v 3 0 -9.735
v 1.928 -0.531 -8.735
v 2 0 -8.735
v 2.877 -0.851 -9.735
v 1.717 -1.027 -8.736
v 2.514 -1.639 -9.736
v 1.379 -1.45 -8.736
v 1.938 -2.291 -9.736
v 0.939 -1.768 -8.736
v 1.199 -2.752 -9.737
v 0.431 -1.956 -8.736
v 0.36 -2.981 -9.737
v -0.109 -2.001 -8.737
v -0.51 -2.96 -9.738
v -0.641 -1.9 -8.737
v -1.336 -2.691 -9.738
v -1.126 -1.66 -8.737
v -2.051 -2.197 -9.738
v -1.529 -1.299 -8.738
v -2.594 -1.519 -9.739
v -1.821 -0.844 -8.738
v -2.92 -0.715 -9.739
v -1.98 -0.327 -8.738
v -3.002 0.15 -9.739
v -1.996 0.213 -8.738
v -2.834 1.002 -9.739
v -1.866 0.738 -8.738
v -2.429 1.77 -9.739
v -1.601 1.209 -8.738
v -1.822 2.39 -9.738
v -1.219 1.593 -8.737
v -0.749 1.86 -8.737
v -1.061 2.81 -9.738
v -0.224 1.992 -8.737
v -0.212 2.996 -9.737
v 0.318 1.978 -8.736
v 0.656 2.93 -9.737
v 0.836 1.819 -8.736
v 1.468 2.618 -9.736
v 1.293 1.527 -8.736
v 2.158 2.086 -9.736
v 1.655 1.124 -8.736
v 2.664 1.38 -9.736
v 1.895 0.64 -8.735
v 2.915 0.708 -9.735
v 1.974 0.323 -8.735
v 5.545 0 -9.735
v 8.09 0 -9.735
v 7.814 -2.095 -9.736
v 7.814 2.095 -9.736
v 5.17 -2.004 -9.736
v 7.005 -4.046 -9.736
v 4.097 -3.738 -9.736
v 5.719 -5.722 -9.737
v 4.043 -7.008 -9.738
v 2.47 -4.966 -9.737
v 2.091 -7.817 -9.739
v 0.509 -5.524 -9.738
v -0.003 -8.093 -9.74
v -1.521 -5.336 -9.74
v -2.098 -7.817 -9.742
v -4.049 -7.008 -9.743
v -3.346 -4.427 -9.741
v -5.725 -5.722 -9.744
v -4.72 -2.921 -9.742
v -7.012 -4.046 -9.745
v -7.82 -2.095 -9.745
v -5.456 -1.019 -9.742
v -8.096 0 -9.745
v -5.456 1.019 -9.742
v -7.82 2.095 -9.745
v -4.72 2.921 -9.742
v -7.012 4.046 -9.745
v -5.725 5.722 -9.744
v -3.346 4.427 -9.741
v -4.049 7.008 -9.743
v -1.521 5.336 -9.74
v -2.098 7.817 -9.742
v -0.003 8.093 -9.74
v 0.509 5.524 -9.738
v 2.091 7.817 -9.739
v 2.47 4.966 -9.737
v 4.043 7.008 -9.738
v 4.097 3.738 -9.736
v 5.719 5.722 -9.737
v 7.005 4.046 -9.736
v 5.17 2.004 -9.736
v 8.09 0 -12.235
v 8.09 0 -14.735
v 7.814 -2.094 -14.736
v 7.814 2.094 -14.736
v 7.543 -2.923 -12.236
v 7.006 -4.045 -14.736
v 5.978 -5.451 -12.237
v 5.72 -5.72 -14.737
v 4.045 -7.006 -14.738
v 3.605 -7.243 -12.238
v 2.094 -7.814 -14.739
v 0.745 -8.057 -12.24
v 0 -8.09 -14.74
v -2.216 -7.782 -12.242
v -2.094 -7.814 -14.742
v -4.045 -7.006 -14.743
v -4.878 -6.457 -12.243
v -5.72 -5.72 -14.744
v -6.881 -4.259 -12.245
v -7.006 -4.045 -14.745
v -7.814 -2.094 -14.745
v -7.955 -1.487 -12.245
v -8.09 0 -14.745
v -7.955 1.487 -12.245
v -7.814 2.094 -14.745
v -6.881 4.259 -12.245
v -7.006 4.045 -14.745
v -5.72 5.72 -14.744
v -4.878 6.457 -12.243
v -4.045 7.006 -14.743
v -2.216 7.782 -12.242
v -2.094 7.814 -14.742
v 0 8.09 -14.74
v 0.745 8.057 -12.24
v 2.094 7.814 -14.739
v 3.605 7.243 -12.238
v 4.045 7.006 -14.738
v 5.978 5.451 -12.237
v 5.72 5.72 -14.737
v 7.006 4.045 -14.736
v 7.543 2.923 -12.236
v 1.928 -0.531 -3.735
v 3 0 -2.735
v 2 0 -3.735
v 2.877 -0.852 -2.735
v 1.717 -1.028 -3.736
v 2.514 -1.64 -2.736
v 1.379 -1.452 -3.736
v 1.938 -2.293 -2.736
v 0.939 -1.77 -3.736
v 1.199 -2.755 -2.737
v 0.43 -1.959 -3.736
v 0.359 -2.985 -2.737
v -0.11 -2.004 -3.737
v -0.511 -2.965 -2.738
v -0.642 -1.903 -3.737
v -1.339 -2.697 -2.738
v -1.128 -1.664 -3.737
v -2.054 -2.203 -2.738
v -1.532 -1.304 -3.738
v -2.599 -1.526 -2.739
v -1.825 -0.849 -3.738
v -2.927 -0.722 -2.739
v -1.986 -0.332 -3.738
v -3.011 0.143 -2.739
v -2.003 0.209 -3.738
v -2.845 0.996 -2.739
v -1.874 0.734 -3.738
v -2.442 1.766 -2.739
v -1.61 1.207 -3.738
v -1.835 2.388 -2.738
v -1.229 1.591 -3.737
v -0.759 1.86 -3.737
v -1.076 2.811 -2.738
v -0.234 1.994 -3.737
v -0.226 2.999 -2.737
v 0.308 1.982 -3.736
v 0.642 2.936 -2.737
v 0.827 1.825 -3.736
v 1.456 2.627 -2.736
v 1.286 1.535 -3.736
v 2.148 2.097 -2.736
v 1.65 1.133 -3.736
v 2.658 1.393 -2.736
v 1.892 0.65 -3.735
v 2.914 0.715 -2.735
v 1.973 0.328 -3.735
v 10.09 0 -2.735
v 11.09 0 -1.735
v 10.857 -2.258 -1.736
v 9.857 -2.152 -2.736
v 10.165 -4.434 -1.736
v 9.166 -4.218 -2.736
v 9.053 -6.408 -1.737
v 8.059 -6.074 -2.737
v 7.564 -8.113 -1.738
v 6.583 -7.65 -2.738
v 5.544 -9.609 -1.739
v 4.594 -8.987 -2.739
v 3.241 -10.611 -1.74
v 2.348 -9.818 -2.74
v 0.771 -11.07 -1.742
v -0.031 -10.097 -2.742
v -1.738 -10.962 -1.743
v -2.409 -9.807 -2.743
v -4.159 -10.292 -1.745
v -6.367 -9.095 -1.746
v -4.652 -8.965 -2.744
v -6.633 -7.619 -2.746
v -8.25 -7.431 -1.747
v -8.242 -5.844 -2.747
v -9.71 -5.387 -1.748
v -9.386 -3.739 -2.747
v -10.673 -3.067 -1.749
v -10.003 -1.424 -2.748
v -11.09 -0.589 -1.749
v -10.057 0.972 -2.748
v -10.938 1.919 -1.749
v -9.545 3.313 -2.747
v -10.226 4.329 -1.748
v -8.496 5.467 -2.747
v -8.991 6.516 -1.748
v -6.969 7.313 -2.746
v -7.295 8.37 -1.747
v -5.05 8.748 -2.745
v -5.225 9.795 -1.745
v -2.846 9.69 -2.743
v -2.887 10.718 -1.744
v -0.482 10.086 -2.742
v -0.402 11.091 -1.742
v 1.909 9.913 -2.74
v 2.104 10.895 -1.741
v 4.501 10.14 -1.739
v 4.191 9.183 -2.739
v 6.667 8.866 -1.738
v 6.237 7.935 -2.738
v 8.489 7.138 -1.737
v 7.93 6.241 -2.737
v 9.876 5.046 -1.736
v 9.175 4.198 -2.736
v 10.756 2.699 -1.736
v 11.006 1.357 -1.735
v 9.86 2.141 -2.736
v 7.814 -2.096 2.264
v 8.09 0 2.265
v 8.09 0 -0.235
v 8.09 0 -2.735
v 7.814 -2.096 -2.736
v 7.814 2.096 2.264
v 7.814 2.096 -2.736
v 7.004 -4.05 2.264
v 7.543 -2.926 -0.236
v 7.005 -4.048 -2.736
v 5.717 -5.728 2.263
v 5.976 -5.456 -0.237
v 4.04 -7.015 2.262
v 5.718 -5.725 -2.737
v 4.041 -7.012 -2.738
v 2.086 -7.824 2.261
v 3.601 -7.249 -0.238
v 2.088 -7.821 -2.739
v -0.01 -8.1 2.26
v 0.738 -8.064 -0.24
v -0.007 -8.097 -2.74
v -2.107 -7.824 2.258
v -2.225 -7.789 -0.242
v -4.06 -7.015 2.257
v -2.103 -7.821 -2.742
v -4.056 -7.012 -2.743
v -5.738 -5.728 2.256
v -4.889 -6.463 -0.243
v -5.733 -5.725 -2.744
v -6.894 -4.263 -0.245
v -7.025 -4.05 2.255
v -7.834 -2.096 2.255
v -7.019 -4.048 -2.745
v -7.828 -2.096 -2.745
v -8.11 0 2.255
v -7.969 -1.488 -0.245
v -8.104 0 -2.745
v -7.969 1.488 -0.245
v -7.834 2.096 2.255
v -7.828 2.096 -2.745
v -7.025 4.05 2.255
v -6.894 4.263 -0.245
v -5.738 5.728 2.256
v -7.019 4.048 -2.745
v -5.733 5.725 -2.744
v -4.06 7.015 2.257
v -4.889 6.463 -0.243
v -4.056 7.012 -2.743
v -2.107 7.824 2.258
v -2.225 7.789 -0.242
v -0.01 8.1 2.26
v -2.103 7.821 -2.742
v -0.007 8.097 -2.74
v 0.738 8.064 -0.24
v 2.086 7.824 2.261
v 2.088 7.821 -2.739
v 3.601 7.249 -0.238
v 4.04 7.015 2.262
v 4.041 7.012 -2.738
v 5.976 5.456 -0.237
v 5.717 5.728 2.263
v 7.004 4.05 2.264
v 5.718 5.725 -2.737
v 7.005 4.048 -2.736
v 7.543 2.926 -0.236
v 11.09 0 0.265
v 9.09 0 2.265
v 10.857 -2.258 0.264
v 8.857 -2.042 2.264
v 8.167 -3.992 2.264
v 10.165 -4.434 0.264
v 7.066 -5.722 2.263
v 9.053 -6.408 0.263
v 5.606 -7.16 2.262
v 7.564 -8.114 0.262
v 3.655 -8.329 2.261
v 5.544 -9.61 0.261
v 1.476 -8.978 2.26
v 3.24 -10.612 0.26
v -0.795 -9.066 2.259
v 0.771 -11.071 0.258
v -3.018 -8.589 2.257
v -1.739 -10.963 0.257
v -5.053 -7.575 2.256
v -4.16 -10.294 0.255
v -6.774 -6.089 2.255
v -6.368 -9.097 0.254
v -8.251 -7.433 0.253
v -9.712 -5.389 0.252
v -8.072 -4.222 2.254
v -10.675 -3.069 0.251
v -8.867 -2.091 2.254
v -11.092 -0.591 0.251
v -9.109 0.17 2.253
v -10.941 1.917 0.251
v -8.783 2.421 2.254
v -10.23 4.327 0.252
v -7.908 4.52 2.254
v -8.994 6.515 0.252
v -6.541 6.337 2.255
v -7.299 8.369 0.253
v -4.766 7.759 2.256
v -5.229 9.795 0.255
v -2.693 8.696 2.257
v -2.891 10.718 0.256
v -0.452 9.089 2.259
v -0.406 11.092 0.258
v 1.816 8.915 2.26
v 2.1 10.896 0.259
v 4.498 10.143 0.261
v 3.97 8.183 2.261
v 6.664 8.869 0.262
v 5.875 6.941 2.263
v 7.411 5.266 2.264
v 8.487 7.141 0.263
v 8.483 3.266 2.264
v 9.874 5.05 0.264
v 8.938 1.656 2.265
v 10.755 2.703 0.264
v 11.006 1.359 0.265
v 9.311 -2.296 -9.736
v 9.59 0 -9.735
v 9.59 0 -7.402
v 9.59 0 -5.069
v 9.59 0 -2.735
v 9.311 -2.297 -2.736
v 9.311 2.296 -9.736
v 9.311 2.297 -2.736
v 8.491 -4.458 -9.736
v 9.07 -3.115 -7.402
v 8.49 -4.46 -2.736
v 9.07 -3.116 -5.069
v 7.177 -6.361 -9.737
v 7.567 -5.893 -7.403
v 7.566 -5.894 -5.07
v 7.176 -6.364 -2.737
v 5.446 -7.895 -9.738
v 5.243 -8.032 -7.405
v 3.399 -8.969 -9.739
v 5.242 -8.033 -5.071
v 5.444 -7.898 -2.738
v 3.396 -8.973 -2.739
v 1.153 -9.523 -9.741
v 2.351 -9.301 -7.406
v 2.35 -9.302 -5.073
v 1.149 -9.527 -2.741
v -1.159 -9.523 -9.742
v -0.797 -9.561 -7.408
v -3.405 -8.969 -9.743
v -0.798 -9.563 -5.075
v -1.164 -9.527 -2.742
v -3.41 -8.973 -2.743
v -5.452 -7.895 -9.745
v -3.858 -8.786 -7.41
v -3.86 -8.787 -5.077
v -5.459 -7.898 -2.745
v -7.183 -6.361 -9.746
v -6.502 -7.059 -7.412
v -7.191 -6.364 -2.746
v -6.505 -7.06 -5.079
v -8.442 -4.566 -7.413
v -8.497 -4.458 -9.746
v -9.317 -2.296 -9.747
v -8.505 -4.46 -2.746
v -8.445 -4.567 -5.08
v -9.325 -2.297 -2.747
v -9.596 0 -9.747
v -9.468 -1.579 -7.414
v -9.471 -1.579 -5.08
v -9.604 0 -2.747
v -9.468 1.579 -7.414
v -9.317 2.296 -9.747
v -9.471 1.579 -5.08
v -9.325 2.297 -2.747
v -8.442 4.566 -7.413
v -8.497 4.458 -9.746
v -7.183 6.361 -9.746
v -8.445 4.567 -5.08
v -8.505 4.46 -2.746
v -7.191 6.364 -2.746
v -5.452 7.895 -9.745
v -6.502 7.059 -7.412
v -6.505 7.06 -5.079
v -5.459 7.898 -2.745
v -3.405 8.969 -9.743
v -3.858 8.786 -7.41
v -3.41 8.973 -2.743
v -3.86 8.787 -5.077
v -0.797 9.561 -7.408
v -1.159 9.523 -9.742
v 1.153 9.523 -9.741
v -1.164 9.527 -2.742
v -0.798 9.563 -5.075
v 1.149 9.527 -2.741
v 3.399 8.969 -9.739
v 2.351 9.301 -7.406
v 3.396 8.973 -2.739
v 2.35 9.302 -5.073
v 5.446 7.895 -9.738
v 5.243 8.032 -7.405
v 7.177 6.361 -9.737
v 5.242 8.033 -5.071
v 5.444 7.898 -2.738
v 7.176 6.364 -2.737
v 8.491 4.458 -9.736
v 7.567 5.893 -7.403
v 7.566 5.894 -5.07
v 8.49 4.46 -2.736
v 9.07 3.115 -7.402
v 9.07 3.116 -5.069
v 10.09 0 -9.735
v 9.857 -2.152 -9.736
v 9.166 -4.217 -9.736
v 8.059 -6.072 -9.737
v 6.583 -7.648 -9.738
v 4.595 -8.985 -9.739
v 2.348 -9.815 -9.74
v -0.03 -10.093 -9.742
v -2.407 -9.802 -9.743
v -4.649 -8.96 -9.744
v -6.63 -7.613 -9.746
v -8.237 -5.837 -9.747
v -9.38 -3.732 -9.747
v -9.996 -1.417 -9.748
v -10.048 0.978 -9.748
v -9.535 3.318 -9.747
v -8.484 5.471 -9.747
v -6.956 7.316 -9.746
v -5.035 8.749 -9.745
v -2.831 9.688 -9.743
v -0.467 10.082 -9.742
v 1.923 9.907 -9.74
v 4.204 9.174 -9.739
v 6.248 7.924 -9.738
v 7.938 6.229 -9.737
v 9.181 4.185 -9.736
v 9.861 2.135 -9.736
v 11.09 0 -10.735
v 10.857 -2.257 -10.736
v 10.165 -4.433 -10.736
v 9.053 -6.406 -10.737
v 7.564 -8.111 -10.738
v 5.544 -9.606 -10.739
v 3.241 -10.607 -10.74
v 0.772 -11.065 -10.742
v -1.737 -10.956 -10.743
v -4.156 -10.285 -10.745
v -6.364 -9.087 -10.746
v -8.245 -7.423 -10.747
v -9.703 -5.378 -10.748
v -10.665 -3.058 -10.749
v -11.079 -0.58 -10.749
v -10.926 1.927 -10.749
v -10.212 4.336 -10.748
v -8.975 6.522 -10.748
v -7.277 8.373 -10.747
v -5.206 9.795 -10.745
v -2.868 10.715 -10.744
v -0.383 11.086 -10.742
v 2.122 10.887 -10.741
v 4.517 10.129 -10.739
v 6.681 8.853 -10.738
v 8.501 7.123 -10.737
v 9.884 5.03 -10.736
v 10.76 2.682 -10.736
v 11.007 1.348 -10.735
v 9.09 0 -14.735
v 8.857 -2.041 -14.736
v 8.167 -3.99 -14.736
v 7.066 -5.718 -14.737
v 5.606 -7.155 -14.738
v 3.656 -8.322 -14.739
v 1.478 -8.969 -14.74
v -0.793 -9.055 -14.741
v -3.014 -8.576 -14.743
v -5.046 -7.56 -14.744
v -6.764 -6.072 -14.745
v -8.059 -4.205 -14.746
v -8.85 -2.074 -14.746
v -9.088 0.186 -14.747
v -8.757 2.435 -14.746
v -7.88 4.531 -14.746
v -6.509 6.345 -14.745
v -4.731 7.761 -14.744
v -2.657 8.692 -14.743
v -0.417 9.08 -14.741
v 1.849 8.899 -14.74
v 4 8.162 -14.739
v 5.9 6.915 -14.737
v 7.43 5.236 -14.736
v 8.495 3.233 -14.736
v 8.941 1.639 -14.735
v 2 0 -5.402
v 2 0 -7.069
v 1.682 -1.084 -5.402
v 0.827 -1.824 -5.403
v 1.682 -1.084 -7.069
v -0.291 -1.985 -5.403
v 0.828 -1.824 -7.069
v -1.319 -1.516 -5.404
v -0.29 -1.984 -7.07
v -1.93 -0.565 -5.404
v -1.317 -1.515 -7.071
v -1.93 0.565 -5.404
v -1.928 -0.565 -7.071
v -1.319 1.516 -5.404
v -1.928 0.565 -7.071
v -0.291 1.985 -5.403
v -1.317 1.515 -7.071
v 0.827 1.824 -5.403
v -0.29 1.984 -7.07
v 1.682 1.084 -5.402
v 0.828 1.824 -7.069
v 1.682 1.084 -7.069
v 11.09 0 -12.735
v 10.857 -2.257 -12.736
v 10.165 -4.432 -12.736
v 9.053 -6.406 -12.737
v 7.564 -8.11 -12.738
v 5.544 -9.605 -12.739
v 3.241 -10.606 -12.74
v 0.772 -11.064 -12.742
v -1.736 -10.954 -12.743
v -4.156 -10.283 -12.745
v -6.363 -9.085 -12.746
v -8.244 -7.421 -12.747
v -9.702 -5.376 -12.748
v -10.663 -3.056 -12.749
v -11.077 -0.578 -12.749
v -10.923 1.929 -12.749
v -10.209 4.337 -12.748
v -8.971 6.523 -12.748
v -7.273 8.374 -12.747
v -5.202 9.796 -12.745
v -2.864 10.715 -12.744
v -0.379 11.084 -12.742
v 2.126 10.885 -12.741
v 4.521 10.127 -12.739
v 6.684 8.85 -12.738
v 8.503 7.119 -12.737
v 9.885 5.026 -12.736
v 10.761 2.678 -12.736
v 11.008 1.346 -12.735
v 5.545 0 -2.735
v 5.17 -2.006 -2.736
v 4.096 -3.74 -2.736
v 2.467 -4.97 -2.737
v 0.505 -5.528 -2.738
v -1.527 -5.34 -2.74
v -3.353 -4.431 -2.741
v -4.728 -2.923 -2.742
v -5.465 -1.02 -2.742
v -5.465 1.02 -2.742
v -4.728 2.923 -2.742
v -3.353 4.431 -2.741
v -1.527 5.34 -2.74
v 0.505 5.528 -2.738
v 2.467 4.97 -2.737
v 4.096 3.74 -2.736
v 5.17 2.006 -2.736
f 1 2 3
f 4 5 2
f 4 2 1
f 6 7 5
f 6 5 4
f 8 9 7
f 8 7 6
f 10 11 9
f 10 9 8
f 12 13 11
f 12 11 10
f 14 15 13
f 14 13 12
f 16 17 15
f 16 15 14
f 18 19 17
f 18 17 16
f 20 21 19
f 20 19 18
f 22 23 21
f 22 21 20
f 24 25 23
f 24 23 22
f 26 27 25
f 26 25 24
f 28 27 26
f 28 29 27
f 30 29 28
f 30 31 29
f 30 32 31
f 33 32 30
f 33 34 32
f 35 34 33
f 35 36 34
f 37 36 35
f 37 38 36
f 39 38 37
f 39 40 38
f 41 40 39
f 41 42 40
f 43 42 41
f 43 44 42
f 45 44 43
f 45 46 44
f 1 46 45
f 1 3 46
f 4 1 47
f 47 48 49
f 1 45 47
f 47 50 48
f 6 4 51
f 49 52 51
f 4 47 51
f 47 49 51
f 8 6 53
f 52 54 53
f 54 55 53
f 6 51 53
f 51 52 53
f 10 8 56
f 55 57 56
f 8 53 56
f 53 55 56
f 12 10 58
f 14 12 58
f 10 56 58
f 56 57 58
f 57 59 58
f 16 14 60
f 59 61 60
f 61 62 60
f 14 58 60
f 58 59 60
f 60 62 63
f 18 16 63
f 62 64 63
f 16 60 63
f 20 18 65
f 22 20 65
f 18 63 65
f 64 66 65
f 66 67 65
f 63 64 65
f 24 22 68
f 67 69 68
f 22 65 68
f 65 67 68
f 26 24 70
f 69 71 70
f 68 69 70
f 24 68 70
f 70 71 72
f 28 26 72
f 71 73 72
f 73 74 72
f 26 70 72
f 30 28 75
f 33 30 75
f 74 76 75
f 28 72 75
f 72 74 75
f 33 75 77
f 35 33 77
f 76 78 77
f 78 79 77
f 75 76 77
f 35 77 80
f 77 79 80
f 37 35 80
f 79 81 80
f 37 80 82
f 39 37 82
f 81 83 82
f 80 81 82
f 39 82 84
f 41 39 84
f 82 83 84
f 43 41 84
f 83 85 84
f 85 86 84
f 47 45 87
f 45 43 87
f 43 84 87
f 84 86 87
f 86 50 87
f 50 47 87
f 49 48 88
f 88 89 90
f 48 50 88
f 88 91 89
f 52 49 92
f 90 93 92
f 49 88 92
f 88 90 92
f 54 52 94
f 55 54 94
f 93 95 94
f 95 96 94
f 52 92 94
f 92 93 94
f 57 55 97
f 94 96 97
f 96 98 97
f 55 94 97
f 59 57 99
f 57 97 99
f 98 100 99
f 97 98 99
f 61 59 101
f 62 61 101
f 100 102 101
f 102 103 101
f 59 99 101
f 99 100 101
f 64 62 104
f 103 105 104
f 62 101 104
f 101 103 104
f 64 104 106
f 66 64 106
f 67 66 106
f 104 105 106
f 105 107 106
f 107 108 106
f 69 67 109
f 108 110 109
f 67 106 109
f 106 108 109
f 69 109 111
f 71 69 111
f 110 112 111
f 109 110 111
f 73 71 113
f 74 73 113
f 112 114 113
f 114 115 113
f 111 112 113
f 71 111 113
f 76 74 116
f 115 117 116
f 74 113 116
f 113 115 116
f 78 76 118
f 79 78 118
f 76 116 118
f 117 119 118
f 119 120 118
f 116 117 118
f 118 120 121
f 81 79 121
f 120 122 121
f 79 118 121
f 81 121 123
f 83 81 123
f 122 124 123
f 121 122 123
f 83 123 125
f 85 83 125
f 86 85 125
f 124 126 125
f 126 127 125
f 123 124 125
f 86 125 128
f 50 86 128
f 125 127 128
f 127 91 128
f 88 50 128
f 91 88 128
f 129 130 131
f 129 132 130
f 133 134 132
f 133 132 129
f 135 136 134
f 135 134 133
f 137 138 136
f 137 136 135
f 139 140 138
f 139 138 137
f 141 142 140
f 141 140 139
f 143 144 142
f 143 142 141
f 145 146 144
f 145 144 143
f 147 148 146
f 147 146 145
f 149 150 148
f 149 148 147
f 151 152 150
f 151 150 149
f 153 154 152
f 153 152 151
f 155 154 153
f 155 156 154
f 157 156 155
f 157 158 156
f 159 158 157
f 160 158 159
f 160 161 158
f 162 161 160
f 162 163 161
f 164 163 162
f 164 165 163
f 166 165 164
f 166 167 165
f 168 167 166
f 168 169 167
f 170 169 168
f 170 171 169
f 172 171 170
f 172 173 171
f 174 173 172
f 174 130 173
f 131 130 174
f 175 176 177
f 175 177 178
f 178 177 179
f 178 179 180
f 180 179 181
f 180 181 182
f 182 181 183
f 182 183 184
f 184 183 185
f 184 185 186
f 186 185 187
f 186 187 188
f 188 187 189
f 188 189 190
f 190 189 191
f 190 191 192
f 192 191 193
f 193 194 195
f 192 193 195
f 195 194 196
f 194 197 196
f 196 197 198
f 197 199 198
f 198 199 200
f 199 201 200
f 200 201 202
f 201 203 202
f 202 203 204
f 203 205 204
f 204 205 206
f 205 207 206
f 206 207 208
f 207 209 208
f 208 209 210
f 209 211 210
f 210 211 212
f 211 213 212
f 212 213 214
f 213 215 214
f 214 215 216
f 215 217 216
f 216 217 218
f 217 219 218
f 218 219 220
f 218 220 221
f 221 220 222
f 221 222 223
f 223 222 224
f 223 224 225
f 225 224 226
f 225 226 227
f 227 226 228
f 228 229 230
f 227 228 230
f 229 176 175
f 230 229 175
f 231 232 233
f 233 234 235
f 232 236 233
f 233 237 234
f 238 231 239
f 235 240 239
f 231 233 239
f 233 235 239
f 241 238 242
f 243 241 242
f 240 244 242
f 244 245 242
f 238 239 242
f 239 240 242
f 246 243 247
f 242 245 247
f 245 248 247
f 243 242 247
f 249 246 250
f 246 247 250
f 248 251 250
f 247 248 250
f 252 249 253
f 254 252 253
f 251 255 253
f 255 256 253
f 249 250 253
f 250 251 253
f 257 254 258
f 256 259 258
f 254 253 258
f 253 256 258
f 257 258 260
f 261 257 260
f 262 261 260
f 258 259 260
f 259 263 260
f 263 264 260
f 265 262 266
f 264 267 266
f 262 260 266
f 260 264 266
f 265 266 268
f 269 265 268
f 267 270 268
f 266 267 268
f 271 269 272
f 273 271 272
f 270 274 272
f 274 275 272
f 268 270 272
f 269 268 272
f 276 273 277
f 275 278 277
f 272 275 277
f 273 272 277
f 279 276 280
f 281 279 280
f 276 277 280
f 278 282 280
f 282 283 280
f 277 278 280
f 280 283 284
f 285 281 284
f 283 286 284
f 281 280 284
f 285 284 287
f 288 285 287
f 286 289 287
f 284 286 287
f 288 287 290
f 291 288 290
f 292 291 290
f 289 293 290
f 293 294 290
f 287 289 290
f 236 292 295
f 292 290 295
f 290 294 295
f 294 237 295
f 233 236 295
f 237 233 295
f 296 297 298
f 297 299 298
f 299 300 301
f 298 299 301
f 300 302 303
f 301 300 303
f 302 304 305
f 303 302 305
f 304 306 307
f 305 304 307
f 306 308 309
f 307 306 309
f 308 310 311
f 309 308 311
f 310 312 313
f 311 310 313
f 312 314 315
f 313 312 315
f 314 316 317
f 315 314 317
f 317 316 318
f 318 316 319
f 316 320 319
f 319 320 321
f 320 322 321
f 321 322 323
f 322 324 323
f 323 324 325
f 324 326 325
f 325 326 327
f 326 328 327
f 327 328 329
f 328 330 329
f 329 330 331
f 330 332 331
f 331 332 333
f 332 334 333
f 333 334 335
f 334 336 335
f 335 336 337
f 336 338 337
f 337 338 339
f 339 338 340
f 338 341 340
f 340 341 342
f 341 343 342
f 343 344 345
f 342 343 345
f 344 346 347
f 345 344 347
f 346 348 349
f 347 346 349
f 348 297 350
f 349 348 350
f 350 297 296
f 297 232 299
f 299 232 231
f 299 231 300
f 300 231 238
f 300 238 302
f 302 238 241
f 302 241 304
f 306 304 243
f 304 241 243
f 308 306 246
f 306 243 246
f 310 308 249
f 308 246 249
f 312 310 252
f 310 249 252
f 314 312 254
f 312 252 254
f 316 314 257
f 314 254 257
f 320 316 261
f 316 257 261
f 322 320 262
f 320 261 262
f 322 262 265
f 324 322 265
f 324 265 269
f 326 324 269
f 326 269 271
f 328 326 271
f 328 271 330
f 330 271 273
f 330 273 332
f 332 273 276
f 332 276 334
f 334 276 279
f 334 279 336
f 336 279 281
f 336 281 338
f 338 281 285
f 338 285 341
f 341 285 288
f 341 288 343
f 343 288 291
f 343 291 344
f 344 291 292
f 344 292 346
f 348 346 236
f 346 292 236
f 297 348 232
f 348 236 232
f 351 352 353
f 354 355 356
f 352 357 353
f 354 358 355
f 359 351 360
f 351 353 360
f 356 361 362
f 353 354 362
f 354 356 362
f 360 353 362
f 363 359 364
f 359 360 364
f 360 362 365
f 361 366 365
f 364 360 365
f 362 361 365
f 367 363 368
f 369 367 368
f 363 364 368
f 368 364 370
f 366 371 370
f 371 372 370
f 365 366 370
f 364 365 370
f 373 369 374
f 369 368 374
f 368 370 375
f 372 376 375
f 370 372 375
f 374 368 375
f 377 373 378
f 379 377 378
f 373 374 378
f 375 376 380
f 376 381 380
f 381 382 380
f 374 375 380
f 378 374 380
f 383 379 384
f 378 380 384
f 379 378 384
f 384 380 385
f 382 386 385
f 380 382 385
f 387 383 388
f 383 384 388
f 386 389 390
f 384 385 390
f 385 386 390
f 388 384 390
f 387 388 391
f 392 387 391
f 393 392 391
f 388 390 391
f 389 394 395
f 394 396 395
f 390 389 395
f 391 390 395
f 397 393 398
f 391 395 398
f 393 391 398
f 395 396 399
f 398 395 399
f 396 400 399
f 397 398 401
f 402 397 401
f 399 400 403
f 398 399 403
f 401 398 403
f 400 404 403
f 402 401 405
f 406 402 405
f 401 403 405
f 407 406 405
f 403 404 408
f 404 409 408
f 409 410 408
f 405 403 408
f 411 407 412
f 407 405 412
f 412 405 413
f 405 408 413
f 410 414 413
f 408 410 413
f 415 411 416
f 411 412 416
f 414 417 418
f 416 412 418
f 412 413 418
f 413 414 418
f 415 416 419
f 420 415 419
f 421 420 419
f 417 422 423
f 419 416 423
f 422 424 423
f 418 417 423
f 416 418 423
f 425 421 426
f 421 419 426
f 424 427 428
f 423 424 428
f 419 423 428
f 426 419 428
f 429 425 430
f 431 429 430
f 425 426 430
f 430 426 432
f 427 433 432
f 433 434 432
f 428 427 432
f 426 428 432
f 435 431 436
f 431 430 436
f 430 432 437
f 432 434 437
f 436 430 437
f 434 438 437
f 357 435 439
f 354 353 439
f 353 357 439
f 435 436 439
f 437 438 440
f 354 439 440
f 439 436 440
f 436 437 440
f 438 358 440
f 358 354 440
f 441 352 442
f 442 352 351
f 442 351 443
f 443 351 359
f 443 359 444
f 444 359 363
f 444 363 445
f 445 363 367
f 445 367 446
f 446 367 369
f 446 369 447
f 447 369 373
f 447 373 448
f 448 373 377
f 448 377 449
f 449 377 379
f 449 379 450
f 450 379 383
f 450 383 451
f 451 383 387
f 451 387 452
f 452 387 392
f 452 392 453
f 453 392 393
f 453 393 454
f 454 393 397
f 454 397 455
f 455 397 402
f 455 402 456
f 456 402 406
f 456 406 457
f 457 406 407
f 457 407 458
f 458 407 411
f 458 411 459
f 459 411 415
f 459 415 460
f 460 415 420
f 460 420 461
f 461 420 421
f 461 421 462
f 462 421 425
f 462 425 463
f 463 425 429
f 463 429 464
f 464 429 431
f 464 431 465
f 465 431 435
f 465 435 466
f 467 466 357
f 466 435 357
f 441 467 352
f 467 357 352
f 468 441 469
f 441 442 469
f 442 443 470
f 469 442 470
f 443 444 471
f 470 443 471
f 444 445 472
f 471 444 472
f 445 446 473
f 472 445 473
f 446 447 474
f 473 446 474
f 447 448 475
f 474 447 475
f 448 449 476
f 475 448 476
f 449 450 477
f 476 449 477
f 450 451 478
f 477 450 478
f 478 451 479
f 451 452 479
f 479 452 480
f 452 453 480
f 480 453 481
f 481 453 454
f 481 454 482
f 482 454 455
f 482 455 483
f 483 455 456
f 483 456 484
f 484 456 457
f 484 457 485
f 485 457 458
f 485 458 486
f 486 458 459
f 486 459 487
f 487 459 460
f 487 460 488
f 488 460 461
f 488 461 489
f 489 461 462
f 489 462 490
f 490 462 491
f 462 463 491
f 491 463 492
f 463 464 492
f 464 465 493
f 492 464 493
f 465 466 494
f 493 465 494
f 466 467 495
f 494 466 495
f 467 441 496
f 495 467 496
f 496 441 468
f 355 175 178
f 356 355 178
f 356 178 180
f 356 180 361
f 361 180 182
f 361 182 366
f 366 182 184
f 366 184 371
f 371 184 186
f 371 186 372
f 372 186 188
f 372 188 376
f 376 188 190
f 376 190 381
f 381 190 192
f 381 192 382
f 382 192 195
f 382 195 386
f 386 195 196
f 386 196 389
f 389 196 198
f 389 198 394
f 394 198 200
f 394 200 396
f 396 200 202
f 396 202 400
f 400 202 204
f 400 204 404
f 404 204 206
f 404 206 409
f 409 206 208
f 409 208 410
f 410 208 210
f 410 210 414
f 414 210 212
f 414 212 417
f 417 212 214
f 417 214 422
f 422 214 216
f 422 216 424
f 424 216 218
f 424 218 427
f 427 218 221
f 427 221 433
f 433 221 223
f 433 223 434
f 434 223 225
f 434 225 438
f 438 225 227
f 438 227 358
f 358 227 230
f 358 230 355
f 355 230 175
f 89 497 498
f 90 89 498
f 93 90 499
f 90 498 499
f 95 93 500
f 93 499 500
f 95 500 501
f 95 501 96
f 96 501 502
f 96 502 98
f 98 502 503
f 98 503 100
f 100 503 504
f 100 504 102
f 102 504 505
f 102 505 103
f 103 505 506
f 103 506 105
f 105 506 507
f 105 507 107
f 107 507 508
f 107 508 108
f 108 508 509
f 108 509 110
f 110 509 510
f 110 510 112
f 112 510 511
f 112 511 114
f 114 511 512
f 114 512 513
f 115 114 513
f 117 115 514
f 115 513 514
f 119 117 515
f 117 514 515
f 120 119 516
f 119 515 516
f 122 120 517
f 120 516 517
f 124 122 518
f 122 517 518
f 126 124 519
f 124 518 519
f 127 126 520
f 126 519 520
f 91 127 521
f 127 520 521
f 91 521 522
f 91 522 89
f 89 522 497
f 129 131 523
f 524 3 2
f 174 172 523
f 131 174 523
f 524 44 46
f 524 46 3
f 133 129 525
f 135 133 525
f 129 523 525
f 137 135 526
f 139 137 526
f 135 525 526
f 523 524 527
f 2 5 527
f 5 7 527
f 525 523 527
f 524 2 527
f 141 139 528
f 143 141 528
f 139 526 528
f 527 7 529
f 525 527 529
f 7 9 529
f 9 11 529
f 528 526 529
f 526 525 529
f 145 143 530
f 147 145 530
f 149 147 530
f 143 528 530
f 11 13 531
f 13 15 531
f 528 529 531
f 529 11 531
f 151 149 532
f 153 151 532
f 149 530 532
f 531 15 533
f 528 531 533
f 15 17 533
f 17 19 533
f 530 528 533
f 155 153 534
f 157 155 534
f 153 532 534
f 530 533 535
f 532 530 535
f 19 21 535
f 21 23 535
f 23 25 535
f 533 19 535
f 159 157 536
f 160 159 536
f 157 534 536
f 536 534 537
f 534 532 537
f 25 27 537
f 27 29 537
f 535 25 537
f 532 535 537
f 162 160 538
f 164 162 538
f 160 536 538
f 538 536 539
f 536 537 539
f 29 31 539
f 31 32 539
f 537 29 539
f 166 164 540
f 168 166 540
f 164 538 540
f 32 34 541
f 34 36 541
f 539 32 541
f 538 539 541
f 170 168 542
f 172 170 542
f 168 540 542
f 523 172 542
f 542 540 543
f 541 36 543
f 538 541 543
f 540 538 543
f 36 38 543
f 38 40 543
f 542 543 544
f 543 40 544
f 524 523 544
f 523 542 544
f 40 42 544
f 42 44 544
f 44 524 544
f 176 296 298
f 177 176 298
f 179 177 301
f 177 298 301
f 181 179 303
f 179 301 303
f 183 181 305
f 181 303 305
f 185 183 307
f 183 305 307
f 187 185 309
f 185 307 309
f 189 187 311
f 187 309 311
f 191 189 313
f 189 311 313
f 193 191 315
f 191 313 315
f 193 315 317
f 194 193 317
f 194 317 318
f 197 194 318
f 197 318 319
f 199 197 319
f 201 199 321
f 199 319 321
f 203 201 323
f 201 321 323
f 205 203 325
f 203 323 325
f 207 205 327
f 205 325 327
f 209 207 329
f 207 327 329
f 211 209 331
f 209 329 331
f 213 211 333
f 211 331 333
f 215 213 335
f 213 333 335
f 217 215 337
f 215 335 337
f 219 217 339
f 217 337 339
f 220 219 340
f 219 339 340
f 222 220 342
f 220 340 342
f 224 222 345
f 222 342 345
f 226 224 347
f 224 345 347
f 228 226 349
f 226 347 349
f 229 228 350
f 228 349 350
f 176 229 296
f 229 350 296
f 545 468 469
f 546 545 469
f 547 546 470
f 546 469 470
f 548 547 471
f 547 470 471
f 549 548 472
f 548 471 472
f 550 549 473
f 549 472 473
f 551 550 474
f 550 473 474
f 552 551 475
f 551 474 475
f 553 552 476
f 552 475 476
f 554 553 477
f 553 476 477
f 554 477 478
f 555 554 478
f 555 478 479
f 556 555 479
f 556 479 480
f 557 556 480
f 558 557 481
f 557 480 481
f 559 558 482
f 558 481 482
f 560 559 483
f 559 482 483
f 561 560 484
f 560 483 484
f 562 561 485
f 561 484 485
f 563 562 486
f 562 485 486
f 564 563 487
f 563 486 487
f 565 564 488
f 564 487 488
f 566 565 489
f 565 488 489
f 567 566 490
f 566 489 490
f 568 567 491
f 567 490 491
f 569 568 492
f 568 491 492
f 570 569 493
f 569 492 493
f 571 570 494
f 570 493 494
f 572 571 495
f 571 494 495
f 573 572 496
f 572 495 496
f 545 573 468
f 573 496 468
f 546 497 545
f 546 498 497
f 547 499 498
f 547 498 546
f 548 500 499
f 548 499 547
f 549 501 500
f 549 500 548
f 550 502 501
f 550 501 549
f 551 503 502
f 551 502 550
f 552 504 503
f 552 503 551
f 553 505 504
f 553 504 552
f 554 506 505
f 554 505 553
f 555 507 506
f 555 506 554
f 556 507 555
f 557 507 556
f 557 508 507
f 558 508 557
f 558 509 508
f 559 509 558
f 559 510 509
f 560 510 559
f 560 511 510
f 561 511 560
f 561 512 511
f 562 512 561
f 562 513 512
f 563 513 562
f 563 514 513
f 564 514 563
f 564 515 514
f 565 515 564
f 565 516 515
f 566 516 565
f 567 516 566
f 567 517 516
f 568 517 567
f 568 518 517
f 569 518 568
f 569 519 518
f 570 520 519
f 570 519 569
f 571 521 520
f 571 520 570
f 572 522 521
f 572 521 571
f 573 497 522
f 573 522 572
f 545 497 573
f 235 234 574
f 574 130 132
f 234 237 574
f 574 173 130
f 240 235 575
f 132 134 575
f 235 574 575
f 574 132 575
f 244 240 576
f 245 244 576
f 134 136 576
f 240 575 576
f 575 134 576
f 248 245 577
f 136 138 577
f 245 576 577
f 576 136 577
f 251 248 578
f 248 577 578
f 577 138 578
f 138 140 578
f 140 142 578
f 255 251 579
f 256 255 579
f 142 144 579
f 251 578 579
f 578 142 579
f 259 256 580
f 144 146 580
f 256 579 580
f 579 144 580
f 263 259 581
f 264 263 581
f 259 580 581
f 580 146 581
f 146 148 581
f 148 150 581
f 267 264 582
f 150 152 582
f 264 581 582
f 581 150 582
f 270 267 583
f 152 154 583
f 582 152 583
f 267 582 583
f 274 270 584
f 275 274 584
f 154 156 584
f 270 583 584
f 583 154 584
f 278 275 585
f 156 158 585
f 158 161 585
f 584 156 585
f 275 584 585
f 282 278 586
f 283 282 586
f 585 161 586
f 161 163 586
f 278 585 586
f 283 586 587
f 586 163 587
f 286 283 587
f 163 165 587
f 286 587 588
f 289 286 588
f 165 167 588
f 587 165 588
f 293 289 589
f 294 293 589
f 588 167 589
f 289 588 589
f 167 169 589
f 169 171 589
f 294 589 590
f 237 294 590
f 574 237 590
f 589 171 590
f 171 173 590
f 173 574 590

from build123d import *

# Parameters (mm, degrees)
F2_SIZE = 2
F3_SIZE = 1


with BuildPart() as f1:
    # F0 (on Front) → F1 (revolve)
    with BuildSketch(Plane.XZ):
        Polygon((11.0896060326, 2.2645946667), (8.0896060326, 2.2645946667), (8.0896060326, -2.7354053333), (9.5896060326, -2.7354053333), (11.0896060326, -2.7354053333), align=None)
        Polygon((9.5896060326, -2.7354053333), (8.0896060326, -2.7354053333), (1.9999996262, -2.7354053333), (1.9999996262, -9.7354053333), (8.0896060326, -9.7354053333), (9.5896060326, -9.7354053333), (9.5896060326, -2.7403513981), align=None)
        Polygon((11.0896060326, -9.7354053333), (9.5896060326, -9.7354053333), (8.0896060326, -9.7354053333), (8.0896060326, -14.7354053333), (11.0896060326, -14.7354053333), align=None)
    revolve(axis=Axis((-0.0051969837, 0, -6.2354053333), (0.0006114097, 0, -0.9999998131)))

    # F2
    f2_edges = [f1.edges().sort_by_distance(p)[0] for p in [
        (-11.089598, 0, -14.748966),
        (-11.110386, 0, 2.251021),
    ]]
    chamfer(f2_edges, length=F2_SIZE)

    # F3
    f3_edges = [f1.edges().sort_by_distance(p)[0] for p in [
        (-11.104272, 0, -2.748975),
        (-11.095712, 0, -9.74897),
        (-2.014672, 0, -2.73786),
        (-2.006112, 0, -9.737855),
    ]]
    chamfer(f3_edges, length=F3_SIZE)


solid = f1.part
